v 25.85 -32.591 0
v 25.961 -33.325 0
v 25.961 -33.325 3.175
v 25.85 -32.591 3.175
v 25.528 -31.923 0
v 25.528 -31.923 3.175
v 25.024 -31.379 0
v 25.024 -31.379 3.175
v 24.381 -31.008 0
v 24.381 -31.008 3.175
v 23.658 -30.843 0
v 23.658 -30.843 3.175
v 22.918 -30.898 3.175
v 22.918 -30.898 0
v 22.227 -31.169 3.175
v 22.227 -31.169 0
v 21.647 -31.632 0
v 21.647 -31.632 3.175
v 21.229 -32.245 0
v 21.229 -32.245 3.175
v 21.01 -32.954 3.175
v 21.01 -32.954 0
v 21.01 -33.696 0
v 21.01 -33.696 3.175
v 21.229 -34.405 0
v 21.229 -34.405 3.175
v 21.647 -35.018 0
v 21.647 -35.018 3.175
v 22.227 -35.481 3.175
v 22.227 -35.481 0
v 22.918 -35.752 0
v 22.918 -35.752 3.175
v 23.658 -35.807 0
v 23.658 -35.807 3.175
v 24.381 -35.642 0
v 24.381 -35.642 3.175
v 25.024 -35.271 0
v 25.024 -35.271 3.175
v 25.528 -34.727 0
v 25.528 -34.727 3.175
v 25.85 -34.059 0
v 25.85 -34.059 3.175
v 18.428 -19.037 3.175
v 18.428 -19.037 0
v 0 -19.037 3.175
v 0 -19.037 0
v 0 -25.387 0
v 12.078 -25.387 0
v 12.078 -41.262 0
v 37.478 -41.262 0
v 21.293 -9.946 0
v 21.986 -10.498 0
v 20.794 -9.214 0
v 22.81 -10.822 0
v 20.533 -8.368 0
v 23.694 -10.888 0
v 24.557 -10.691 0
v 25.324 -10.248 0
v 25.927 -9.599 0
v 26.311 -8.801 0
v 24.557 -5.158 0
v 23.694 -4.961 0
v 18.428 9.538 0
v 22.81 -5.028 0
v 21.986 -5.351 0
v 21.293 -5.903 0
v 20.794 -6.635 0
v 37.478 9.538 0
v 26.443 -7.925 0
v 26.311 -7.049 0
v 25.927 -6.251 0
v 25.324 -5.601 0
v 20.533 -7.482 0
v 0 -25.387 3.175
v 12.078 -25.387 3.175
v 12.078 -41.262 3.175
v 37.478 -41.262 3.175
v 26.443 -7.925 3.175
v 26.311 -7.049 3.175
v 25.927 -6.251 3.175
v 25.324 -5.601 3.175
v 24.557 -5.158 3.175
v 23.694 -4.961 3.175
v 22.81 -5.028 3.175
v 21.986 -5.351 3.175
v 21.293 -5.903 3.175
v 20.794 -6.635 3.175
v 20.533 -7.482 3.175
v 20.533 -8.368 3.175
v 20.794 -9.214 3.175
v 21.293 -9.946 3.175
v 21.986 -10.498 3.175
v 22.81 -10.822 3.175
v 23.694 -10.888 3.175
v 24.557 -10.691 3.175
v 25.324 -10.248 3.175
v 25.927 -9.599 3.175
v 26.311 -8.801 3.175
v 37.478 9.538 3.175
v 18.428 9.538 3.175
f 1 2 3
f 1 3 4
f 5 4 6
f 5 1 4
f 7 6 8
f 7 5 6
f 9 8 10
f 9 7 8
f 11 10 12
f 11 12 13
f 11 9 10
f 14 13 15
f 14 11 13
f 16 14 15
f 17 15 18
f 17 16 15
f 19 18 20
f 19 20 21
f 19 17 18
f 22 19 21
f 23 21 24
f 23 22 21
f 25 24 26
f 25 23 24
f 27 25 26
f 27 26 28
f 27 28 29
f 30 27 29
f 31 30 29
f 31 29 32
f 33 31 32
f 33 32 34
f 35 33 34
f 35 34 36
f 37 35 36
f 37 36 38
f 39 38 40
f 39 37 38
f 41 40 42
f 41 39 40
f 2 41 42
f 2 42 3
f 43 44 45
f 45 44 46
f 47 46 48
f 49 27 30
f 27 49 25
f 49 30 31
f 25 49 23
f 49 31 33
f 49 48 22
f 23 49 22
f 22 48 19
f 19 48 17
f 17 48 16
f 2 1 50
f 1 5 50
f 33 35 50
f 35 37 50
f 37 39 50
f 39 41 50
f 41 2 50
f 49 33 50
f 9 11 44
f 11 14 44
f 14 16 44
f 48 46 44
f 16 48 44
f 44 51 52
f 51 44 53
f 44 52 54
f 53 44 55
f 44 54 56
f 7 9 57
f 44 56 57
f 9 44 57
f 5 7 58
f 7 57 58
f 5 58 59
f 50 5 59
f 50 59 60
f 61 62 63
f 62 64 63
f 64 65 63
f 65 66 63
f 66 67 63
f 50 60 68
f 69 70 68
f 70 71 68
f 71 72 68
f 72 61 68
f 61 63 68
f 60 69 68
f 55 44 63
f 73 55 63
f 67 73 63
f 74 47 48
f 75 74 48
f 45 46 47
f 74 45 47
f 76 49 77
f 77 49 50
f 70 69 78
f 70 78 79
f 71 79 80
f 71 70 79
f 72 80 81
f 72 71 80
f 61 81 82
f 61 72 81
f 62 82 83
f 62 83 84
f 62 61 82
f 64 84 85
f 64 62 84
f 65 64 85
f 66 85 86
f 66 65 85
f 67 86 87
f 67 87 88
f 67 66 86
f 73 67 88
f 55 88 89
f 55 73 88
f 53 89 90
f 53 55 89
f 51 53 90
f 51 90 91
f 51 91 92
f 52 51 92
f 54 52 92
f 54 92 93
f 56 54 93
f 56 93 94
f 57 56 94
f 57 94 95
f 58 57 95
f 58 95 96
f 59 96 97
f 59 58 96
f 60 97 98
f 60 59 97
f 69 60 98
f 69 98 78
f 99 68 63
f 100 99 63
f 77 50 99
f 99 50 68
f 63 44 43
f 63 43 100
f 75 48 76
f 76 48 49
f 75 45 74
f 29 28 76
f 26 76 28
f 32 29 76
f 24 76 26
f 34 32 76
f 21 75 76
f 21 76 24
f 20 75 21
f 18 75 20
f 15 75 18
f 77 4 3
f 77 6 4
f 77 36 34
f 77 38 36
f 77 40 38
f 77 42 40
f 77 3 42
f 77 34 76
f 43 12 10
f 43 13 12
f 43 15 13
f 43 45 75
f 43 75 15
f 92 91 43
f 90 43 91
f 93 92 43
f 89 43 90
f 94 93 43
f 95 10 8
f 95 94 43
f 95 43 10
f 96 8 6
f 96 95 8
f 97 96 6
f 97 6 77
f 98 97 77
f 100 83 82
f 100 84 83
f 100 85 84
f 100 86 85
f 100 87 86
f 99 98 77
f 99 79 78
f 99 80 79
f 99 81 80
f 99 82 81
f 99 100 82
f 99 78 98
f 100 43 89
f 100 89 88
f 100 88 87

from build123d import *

# Parameters (mm, degrees)
SKETCH1_R           = 2.4892
SKETCH1_R_2         = 2.9718
BOSS_EXTRUDE1_DEPTH = 3.175
SKETCH2_W           = 18.4277
SKETCH2_H           = 6.35
CUT_EXTRUDE1_DEPTH  = 4.175


with BuildPart() as part:
    # Sketch1 → Boss-Extrude1 (new body)
    with BuildSketch(Plane.XY):
        Polygon((37.4777, 9.5377), (0, 9.5377), (0, 3.1877), (18.4277, 3.1877), (18.4277, -19.0373), (0, -19.0373), (0, -25.3873), (12.0777, -25.3873), (12.0777, -41.2623), (37.4777, -41.2623), align=None)
        with Locations((23.471581917, -33.3248)):
            Circle(SKETCH1_R, mode=Mode.SUBTRACT)
        with Locations((23.471581917, -7.9248)):
            Circle(SKETCH1_R_2, mode=Mode.SUBTRACT)
    extrude(amount=BOSS_EXTRUDE1_DEPTH)

    # Sketch2 → Cut-Extrude1 (cut, through all)
    with BuildSketch(Plane(origin=(0, 0, 0), x_dir=(-1, 0, 0), z_dir=(0, 0, -1))):
        with Locations((-9.21385, 6.3627)):
            Rectangle(SKETCH2_W, SKETCH2_H)
    extrude(amount=-CUT_EXTRUDE1_DEPTH, mode=Mode.SUBTRACT)


solid = part.part
